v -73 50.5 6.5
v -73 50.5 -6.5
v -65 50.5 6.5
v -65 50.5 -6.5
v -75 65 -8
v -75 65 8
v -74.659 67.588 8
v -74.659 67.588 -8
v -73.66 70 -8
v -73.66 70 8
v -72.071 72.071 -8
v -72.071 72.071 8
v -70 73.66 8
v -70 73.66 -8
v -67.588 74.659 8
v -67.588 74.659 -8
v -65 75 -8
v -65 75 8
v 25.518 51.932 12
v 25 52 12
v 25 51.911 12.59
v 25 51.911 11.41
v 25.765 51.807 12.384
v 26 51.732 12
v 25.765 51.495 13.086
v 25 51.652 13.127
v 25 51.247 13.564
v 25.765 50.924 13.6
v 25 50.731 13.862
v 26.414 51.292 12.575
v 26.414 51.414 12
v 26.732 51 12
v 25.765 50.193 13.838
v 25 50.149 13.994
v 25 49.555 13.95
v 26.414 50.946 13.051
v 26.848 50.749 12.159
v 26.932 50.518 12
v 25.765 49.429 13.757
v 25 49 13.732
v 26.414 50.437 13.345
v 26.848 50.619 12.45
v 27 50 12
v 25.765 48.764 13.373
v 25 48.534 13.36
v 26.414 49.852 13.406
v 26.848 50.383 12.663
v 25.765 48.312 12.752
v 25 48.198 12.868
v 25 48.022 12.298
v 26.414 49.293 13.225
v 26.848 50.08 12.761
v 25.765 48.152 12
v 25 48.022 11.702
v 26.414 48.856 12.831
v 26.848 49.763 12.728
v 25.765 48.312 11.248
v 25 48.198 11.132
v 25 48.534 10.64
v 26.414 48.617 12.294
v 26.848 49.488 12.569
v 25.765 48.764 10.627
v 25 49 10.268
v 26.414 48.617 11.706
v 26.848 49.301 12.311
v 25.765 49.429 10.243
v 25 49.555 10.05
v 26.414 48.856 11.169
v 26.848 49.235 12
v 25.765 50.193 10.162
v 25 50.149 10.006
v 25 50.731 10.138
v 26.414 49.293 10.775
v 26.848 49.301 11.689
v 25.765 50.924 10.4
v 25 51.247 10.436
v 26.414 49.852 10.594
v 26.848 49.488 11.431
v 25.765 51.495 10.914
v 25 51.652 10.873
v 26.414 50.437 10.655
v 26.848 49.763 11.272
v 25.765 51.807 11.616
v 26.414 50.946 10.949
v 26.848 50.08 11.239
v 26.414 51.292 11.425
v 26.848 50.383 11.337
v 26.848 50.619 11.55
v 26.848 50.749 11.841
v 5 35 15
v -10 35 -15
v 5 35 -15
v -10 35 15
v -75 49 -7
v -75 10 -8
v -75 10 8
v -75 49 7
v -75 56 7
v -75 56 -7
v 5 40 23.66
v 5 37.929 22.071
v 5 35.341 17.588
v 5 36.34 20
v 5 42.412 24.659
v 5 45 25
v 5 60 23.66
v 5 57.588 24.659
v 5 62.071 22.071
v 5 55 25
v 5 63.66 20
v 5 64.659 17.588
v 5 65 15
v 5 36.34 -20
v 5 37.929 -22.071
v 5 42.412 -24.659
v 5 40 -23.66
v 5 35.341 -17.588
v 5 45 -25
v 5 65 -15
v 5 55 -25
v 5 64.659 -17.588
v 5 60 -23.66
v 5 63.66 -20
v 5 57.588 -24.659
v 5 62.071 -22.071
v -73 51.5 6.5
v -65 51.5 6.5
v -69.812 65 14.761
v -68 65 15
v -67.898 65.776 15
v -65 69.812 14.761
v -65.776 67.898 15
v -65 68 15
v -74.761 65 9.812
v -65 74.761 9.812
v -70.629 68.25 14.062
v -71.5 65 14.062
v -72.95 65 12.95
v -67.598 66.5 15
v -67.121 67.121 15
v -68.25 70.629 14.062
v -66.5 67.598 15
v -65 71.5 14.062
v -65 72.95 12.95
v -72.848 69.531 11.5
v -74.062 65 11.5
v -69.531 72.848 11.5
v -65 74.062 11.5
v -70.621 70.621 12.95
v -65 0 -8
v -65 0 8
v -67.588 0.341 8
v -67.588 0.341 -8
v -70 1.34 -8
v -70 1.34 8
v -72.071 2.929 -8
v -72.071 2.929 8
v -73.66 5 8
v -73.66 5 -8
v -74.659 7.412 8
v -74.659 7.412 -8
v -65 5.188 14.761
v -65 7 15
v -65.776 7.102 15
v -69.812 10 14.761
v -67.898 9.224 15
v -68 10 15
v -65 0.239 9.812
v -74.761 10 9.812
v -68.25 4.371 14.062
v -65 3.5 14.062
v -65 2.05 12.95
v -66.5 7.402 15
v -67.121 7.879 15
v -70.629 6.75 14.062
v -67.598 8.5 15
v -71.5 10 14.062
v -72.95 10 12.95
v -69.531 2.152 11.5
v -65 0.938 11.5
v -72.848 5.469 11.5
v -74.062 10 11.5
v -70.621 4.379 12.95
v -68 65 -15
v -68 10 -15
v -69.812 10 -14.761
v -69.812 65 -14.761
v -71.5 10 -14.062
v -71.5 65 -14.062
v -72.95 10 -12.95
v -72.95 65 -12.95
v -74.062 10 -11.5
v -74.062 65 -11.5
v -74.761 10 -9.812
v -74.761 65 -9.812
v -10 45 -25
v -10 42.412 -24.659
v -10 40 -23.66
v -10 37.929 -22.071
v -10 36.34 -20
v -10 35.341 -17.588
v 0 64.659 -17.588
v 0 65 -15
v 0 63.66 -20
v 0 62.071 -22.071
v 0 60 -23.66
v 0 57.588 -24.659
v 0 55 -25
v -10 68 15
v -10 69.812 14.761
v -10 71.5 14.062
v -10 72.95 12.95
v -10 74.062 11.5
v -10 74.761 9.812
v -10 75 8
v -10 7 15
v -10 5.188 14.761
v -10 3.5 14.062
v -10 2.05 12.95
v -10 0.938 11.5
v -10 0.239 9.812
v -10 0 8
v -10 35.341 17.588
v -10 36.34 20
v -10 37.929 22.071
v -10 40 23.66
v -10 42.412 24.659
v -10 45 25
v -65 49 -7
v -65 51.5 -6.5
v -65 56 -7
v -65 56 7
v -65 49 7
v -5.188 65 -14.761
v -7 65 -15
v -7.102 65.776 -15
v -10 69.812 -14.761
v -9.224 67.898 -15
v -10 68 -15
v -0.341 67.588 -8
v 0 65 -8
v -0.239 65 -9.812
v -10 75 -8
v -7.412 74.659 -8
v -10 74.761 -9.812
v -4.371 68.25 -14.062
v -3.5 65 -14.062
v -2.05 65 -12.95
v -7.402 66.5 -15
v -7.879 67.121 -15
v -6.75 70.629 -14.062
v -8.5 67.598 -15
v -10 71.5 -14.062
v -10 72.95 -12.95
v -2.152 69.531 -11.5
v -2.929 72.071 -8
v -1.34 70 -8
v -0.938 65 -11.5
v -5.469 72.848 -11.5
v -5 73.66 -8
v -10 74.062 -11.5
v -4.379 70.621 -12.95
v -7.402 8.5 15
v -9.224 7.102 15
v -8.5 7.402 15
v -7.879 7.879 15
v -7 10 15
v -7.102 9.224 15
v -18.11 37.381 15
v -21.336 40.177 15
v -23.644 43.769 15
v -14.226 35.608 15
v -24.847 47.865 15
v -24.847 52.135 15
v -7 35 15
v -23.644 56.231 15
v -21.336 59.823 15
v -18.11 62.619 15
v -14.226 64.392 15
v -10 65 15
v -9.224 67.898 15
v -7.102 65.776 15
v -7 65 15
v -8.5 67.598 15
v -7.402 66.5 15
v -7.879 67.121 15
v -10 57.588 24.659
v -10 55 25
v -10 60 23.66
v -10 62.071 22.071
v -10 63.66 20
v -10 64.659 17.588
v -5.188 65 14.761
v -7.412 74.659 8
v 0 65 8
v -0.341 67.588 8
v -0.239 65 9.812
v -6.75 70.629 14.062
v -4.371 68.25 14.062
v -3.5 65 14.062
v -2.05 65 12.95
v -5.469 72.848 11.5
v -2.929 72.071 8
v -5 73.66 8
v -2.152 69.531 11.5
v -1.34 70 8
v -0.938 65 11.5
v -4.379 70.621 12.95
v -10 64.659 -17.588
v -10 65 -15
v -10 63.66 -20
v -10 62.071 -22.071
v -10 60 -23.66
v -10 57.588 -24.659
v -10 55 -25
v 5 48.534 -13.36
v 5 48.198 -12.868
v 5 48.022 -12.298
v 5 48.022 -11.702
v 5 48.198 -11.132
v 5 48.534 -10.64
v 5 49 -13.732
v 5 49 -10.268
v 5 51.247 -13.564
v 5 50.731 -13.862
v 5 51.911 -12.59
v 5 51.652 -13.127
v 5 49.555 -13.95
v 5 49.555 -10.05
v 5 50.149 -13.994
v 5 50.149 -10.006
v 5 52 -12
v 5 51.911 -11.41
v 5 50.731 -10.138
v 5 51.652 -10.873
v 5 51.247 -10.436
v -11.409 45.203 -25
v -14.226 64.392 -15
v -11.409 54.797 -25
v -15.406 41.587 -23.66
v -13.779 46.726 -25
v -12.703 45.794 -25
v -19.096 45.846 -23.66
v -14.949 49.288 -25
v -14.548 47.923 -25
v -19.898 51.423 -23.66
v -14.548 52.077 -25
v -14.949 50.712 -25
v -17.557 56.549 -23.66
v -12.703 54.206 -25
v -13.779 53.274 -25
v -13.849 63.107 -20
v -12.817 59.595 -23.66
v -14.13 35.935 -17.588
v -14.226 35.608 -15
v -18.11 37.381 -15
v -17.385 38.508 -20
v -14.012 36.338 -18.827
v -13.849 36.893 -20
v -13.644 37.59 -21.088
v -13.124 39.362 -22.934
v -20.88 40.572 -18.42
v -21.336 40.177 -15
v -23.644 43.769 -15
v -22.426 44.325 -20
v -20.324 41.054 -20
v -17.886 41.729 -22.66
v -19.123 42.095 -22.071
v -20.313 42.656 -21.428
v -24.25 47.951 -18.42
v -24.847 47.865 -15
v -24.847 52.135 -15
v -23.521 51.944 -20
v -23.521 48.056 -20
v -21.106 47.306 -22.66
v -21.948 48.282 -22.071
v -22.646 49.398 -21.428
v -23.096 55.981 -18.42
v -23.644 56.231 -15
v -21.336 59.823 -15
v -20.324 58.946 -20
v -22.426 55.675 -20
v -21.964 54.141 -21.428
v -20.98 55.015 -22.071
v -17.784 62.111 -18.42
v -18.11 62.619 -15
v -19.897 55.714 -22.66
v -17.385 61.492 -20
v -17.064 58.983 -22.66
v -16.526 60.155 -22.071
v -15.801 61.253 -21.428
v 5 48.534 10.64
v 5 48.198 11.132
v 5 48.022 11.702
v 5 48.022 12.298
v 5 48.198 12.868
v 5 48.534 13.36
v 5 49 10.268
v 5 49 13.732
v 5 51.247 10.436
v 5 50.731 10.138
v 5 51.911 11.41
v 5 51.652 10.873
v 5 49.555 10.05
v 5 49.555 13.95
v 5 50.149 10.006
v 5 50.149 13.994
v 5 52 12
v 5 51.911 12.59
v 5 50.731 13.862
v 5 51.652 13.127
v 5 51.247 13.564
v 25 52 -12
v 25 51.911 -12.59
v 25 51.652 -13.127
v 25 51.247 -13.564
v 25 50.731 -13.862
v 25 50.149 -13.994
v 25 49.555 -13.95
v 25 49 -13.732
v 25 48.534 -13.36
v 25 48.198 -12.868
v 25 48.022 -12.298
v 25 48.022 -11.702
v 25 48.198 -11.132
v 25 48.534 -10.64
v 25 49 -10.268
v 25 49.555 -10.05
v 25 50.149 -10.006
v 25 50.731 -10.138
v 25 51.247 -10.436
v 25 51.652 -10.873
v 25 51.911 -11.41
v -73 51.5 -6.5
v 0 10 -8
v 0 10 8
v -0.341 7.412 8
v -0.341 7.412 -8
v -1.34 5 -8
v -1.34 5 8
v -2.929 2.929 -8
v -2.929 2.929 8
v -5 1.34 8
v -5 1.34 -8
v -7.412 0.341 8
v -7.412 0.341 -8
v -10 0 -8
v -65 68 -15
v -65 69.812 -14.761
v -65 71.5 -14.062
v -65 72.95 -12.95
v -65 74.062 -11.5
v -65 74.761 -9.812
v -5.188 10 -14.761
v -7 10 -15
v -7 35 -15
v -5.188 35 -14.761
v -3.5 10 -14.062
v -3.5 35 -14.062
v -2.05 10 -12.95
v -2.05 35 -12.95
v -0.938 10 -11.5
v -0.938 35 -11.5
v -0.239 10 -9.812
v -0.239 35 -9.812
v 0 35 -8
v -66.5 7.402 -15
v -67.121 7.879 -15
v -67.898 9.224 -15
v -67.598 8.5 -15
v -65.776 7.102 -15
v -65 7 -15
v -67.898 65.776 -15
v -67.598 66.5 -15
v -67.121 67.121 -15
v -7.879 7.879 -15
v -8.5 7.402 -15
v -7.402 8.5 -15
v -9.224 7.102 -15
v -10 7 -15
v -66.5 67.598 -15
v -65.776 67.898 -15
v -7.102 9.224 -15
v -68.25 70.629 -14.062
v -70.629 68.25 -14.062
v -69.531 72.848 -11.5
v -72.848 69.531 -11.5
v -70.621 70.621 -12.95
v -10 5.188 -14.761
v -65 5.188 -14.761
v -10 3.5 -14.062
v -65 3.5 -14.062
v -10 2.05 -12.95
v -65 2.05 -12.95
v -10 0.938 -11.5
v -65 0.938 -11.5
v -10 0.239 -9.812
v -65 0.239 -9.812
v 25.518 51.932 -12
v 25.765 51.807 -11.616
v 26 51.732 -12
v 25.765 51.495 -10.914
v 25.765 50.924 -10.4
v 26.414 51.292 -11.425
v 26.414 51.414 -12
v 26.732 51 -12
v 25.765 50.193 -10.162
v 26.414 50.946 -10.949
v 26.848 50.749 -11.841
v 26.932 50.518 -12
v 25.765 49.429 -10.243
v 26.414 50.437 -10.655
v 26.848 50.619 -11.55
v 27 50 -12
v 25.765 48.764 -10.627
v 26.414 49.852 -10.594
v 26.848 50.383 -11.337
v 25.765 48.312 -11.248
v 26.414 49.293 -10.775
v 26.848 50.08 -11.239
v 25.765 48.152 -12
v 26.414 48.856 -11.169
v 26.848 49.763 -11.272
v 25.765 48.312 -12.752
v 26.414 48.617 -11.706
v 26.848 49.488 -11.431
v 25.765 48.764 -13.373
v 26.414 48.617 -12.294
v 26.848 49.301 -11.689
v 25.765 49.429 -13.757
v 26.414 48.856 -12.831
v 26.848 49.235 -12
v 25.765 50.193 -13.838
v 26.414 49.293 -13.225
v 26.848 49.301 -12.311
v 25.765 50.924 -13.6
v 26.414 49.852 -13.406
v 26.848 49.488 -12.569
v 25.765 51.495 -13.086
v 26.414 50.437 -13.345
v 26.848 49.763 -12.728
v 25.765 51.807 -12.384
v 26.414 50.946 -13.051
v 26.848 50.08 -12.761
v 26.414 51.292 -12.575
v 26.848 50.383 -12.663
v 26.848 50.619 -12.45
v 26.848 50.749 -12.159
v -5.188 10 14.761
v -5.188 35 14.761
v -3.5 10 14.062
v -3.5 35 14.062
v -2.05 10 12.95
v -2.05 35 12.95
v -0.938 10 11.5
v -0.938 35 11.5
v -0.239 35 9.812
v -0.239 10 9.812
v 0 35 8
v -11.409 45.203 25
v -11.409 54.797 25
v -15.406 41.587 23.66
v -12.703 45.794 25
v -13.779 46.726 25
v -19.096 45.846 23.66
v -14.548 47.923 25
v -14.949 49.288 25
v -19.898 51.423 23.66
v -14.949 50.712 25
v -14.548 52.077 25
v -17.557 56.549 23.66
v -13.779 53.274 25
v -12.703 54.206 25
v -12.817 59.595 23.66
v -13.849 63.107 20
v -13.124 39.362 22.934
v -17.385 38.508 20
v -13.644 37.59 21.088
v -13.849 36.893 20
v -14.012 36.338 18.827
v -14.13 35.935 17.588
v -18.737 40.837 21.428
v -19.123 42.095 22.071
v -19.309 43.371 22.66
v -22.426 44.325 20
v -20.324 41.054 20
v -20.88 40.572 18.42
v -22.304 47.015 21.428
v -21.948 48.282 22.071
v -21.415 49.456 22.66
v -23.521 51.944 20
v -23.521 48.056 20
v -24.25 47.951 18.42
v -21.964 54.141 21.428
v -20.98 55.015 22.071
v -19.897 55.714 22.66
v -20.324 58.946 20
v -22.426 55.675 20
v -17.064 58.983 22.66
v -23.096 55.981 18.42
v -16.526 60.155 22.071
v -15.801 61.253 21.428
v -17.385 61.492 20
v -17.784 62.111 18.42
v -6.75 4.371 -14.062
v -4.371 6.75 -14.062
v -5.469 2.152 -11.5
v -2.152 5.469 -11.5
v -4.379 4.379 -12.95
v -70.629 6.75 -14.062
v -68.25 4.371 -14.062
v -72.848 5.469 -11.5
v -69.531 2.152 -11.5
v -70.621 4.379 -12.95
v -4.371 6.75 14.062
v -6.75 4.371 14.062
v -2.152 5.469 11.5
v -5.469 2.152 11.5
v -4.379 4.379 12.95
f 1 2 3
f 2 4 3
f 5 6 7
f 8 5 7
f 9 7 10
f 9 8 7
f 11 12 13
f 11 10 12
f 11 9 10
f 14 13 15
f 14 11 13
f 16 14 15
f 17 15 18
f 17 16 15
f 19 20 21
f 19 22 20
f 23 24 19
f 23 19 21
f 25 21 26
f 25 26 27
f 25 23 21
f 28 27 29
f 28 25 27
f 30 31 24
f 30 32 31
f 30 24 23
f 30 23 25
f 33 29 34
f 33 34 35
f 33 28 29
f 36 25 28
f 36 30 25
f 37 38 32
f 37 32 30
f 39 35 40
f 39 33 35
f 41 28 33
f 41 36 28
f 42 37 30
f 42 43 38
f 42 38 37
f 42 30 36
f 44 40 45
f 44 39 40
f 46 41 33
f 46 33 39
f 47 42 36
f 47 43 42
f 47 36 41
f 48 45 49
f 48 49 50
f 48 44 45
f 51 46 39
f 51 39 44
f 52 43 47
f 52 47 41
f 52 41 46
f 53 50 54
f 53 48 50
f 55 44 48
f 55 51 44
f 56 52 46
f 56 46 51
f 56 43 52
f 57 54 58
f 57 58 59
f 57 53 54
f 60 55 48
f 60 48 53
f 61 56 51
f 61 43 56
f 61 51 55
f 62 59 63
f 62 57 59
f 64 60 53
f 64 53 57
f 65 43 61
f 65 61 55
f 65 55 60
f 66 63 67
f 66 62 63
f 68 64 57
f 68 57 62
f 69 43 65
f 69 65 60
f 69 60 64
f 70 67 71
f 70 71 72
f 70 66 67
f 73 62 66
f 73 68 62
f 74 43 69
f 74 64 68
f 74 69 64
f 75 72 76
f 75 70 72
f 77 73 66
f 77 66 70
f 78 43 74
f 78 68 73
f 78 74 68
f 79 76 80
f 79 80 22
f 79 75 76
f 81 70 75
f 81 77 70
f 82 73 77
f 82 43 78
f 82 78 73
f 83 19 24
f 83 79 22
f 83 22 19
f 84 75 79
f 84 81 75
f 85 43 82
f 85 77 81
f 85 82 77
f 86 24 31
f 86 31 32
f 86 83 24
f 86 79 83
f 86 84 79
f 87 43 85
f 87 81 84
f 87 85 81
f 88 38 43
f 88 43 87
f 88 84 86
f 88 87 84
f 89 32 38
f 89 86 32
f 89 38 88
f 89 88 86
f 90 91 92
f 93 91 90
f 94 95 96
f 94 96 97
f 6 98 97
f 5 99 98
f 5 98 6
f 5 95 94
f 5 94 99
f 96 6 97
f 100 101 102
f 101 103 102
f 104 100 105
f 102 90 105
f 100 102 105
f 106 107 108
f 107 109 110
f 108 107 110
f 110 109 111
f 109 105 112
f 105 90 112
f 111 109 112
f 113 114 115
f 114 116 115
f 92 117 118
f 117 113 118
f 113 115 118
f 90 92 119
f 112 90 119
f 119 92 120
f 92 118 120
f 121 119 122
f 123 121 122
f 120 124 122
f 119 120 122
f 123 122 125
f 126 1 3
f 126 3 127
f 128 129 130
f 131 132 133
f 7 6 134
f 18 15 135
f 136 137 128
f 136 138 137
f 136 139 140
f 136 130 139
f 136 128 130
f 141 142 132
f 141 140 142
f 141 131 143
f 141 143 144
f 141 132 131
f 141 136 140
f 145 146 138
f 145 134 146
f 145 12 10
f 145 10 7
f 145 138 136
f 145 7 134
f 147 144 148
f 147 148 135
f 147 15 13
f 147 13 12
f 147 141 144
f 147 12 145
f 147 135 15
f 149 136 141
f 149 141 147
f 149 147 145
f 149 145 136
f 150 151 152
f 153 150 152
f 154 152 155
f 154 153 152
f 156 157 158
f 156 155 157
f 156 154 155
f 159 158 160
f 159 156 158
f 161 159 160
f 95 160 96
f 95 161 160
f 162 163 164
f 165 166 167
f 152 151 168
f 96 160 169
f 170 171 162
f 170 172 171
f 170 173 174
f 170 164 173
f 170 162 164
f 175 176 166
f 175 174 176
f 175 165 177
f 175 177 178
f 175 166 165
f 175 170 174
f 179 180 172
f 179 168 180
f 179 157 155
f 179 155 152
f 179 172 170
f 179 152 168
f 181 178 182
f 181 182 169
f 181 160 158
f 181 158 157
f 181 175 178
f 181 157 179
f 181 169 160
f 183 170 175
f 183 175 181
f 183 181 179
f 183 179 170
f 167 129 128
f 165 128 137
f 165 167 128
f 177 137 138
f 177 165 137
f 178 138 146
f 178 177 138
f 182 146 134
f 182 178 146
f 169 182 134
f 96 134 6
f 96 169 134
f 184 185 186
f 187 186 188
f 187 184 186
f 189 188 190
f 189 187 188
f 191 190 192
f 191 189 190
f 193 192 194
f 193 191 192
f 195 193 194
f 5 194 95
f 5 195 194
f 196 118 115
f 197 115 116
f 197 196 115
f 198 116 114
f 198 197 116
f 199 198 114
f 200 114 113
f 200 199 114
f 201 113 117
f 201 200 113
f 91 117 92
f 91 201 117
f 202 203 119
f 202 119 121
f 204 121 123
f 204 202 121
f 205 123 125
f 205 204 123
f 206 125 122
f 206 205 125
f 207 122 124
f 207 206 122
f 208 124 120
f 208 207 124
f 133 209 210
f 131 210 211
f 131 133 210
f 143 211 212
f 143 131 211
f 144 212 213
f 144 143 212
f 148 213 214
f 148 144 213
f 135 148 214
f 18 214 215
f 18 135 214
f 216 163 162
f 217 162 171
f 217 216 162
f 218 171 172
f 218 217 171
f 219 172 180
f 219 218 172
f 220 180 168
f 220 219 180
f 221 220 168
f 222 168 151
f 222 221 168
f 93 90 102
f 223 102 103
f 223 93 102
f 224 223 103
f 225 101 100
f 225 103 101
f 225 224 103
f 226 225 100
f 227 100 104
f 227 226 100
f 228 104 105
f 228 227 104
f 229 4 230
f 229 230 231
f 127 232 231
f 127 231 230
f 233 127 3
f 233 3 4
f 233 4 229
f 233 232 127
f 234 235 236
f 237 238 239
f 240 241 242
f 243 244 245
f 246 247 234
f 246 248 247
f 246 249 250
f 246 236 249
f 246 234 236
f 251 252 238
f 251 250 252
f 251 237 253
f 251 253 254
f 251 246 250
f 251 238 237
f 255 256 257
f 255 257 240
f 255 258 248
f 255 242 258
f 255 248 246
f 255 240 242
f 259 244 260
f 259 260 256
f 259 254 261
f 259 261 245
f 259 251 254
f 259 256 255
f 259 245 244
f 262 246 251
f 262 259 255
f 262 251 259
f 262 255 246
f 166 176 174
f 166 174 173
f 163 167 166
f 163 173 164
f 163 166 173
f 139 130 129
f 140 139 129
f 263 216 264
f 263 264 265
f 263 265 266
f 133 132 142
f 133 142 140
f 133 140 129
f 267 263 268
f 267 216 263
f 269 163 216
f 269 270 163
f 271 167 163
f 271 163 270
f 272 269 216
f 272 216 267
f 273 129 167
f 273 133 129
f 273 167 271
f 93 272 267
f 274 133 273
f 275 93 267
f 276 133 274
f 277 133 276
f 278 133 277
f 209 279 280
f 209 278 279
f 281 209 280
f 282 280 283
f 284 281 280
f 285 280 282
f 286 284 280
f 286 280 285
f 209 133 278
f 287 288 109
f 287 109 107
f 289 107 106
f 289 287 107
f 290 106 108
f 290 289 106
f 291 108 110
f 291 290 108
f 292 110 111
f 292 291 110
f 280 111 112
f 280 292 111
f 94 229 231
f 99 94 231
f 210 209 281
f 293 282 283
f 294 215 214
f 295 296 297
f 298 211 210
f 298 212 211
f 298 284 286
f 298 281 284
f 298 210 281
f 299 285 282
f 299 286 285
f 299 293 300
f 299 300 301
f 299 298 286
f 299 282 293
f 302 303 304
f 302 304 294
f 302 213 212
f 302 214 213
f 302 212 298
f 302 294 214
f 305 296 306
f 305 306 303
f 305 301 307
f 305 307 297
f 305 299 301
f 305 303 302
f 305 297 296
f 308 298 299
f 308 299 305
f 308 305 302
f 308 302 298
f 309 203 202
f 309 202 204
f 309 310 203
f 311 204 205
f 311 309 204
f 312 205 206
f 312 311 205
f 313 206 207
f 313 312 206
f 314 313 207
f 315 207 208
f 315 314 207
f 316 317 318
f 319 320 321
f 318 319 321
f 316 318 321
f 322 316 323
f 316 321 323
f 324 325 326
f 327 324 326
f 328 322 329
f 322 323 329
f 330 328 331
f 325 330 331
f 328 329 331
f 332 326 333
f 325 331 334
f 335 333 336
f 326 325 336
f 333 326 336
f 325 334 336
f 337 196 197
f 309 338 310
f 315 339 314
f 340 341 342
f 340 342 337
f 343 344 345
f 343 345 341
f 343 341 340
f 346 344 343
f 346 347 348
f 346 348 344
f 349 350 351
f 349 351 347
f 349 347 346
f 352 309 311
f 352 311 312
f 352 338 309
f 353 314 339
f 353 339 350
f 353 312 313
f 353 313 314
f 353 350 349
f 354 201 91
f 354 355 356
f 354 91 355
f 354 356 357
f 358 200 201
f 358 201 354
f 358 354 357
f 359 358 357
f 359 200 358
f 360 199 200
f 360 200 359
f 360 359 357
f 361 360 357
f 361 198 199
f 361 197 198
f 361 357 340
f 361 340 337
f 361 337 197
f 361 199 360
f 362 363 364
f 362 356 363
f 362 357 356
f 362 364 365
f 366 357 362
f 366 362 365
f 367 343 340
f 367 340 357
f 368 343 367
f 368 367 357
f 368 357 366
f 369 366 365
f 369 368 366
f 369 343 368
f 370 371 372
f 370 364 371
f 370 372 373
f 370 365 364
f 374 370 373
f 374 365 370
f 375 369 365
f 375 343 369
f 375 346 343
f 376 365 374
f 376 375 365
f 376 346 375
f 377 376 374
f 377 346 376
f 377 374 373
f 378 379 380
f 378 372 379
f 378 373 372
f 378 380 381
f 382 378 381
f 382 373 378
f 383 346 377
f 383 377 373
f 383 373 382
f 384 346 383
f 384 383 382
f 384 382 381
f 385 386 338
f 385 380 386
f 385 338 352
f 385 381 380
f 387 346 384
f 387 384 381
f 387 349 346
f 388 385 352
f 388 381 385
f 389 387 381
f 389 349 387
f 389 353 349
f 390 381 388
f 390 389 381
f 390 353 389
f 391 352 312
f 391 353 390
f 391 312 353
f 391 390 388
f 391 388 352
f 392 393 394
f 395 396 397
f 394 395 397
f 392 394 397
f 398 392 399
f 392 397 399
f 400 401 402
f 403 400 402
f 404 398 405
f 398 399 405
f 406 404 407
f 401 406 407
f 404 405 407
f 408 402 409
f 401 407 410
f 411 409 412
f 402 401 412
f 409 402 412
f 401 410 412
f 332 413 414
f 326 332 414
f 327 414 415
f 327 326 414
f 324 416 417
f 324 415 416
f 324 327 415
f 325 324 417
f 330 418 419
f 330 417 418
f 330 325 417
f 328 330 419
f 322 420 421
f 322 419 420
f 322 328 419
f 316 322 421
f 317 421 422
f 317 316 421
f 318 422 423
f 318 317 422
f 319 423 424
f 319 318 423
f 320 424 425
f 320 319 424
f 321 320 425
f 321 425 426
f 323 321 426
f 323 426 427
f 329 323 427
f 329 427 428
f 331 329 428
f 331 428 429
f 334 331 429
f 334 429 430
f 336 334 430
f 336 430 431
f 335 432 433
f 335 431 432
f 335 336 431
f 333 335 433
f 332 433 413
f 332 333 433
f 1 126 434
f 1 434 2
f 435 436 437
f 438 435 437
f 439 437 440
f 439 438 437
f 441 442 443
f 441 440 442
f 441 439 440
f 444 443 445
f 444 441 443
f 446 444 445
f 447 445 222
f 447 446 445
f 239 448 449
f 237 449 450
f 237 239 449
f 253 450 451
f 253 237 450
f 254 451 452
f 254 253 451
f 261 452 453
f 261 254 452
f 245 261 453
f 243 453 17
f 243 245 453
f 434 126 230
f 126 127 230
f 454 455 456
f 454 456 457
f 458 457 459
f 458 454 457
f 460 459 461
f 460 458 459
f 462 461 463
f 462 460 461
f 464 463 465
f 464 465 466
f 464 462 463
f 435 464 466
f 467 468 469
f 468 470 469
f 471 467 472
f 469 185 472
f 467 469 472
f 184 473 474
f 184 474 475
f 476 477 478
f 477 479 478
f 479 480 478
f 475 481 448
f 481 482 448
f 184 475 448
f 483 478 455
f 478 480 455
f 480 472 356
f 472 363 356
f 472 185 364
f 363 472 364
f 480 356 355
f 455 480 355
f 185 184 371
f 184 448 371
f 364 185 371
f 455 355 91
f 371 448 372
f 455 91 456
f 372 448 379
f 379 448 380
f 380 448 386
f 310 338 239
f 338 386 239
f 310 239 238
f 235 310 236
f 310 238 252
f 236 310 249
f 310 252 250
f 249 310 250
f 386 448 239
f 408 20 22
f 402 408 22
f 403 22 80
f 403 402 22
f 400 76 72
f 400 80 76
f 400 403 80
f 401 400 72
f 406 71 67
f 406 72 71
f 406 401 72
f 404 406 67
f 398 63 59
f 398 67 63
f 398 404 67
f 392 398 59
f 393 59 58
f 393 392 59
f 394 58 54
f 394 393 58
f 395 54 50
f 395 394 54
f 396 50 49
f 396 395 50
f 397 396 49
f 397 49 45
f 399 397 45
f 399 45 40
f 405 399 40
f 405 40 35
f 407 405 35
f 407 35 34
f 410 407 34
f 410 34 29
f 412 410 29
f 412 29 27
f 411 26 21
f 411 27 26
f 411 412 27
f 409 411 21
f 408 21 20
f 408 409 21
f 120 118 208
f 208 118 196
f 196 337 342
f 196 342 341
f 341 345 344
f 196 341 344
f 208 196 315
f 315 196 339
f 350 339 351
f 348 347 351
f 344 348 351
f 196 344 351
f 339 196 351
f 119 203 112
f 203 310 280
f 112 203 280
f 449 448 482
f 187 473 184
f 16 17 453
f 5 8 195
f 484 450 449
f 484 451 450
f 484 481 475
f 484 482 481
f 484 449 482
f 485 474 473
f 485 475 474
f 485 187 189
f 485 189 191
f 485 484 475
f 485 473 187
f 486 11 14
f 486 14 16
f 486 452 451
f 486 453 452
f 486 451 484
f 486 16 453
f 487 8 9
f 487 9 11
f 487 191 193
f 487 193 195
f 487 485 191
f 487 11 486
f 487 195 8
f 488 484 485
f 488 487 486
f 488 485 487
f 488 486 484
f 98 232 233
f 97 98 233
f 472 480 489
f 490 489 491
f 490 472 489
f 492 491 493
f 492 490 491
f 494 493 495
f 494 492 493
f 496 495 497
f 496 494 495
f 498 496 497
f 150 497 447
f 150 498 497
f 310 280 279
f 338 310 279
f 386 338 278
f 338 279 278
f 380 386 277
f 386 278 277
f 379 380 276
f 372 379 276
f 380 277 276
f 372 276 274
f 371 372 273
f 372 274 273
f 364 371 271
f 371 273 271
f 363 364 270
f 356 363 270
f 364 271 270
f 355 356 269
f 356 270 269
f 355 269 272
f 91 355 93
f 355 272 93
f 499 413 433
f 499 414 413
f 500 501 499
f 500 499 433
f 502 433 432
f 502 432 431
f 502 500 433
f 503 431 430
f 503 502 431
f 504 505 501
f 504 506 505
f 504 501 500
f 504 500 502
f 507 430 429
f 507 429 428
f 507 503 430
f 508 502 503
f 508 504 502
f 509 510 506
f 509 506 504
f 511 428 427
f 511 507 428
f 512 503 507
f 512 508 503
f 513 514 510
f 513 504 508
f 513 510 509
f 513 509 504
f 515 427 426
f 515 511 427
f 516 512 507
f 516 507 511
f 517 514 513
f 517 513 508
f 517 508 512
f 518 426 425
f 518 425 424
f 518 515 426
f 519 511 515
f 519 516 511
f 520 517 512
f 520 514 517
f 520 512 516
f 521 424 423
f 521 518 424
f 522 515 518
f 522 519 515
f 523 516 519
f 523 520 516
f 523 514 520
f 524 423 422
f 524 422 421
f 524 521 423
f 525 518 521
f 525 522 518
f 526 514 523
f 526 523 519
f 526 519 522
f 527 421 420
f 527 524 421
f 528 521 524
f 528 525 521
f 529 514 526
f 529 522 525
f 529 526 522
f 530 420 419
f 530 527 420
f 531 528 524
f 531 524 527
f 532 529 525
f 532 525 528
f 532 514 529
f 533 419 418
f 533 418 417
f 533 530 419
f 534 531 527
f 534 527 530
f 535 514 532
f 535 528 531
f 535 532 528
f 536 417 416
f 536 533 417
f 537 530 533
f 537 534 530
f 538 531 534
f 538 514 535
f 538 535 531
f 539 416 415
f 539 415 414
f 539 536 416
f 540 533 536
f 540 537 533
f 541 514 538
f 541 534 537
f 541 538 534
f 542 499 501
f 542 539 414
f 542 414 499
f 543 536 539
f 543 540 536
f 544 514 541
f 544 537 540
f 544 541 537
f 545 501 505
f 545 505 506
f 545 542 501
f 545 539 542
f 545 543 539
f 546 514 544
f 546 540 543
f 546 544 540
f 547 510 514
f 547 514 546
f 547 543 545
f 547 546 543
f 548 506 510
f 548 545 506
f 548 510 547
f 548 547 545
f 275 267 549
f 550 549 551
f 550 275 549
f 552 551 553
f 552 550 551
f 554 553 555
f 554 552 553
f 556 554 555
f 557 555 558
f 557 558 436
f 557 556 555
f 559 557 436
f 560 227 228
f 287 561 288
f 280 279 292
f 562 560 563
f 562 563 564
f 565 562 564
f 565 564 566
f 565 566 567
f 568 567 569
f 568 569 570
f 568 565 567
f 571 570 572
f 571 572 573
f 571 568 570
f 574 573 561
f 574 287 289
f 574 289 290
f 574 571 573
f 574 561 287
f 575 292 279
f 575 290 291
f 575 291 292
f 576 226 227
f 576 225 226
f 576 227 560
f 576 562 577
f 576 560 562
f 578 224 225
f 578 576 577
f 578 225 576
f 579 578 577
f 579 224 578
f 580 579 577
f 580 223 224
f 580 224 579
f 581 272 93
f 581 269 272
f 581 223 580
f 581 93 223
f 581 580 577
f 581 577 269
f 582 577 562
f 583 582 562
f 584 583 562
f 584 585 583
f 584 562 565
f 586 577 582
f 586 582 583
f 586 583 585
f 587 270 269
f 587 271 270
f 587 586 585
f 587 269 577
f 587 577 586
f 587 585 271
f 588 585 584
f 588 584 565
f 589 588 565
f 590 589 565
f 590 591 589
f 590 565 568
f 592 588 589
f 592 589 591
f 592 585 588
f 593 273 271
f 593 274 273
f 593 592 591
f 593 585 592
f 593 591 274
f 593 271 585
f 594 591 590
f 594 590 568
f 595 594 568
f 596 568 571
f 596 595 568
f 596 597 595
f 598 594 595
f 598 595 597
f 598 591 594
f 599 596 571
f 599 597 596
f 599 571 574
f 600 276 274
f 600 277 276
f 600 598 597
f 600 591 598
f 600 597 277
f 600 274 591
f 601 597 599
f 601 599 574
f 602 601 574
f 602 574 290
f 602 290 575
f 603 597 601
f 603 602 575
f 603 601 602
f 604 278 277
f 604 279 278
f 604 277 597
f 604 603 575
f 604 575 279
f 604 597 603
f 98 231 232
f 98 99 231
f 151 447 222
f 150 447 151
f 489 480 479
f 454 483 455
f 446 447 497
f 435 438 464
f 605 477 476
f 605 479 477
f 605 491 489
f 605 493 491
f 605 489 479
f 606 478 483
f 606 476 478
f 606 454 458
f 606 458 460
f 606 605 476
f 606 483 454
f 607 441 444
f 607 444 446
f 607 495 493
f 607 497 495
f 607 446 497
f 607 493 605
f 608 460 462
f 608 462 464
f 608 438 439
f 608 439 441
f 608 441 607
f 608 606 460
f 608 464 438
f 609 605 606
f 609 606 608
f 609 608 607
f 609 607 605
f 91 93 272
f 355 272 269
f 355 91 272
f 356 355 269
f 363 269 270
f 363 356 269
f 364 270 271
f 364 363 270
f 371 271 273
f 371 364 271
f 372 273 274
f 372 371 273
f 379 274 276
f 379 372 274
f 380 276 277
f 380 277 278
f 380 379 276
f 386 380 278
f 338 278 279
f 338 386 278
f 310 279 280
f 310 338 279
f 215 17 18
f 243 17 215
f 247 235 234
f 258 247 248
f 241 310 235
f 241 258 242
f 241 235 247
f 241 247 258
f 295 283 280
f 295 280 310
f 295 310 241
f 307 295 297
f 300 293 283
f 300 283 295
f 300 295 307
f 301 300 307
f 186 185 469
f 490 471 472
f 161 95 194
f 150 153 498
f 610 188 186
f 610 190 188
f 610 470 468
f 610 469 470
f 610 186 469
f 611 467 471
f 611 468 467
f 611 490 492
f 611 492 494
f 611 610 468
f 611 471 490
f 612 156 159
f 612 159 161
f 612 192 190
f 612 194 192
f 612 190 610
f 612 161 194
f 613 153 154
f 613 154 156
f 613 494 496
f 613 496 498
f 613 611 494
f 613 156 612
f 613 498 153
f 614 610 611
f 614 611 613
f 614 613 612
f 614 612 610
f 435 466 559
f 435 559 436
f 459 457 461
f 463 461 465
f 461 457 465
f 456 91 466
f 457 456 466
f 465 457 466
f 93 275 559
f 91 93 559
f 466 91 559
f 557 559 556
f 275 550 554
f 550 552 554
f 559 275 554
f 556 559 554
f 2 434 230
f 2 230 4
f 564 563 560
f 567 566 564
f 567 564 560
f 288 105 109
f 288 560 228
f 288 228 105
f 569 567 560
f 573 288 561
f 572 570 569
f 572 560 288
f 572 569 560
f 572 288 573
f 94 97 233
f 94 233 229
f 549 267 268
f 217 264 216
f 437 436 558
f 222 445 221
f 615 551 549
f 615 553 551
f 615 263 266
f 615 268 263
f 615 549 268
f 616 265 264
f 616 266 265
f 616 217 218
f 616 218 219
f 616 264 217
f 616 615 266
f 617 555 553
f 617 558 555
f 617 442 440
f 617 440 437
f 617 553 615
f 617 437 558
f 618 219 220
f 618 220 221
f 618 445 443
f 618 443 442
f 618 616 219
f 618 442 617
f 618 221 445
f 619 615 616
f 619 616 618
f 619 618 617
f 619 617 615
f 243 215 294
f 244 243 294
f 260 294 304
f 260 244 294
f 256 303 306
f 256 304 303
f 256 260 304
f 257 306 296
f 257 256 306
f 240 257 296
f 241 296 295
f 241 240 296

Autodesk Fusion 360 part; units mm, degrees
sketch "Sketch1" plane through (0, 0, 0) normal (0, 0, 1) x (1, 0, 0)
  line L0 (-10, 0) -> (-65, 0)
  line L1 (-75, 10) -> (-75, 65)
  line L2 (-65, 75) -> (-10, 75)
  line L3 (0, 65) -> (0, 10)
  arc A0 (-10, 0) -> (0, 10) centre (-10, 10) ccw
  arc A1 (-75, 10) -> (-65, 0) centre (-65, 10) ccw
  arc A2 (-65, 75) -> (-75, 65) centre (-65, 65) ccw
  arc A3 (0, 65) -> (-10, 75) centre (-10, 65) ccw
  dimension "d1" = 10
extrude "Extrude1" add sketch "Sketch1" along normal mid plane 30 makes body 1
sketch "Sketch3" plane through (0, 0, 15) normal (0, 0, 1) x (-1, 0, 0)
  arc A0 (10, 0) -> (0, -10) centre (10, -10) ccw
  line L0 (0, -10) -> (0, -65)
  arc A1 (0, -65) -> (10, -75) centre (10, -65) ccw
  line L1 (10, -75) -> (65, -75)
  arc A2 (65, -75) -> (75, -65) centre (65, -65) ccw
  line L2 (75, -65) -> (75, -10)
  arc A3 (75, -10) -> (65, 0) centre (65, -10) ccw
  line L3 (65, 0) -> (10, 0)
  line L4 (10, -65) -> (0, -65)
  line L5 (10, -35) -> (0, -35)
  line L6 (0, -35) -> (0, -65)
  arc A4 (10, -65) -> (10, -35) centre (10, -50) ccw
extrude "Extrude4" cut sketch "Sketch3" against normal blind 45 contours L0 L4 L5 L6 A4 bodies 1
extrude "Extrude5" add sketch "Sketch3" along normal blind 10 and the other way blind 40 separate body contours L0 L4 L5 L6 A4 makes body 2
fillet "Fillet2" radius 10 3 edges at (-5, 65, 25) (-25, 50, 25) (-5, 35, 25) on bodies 2
fillet "Fillet3" radius 10 3 edges at (-5, 35, -25) (-25, 50, -25) (-5, 65, -25) on bodies 2
extrude "Extrude6" add 1 faces at (0, 45, -5) along direction (1, 0, 0) blind 5 on bodies 2 bodies 2
sketch "Sketch4" plane through (5, 0, 0) normal (1, 0, 0) x (0, 1, 0)
  arc A0 (55, -25) -> (65, -15) centre (55, -15) ccw
  line L0 (65, -15) -> (65, 15)
  arc A1 (65, 15) -> (55, 25) centre (55, 15) ccw
  line L1 (55, 25) -> (45, 25)
  arc A2 (45, 25) -> (35, 15) centre (45, 15) ccw
  line L2 (35, 15) -> (35, -15)
  arc A3 (35, -15) -> (45, -25) centre (45, -15) ccw
  line L3 (45, -25) -> (55, -25)
  circle A4 centre (50, 12) radius 2
  circle A5 centre (50, -12) radius 2
extrude "Extrude7" add sketch "Sketch4" along normal blind 22 separate body contours A4 | A5 makes body 3 at (19.6667, 50.637, 13.8959) makes body 4 at (19.6667, 50.637, -10.1041)
fillet "Fillet4" radius 2 2 edges at (27, 48.1353, 11.2768) (27, 48.1353, -12.7232) on bodies 3 4
fillet "Fillet5" radius 7 16 edges at (-2.9289, 72.0711, 15) (-37.5, 75, 15) (-72.0711, 72.0711, 15) (-75, 37.5, 15) (-72.0711, 2.9289, 15) (-37.5, 0, 15) (-2.9289, 2.9289, 15) (0, 22.5, 15) (0, 22.5, -15) (-2.9289, 2.9289, -15) (-37.5, 0, -15) (-72.0711, 2.9289, -15) (-75, 37.5, -15) (-72.0711, 72.0711, -15) (-37.5, 75, -15) (-2.9289, 72.0711, -15) on bodies 1
sketch "Sketch5" plane through (-75, 0, 0) normal (-1, 0, 0) x (0, -1, 0)
  line L0 (-65, -8) -> (-10, -8)
  line L1 (-10, -8) -> (-10, 8)
  line L2 (-10, 8) -> (-65, 8)
  line L3 (-65, 8) -> (-65, -8)
  line L4 (-56, 7) -> (-49, 7)
  line L5 (-49, 7) -> (-49, -7)
  line L6 (-49, -7) -> (-56, -7)
  line L7 (-56, -7) -> (-56, 7)
extrude "Extrude8" cut sketch "Sketch5" against normal blind 10 contours L4 L5 L6 L7 bodies 1
sketch "Sketch6" plane through (-65, 0, 0) normal (-1, 0, 0) x (0, -1, 0)
  line L0 (-56, -7) -> (-49, -7)
  line L1 (-49, -7) -> (-49, 7)
  line L2 (-49, 7) -> (-56, 7)
  line L3 (-56, 7) -> (-56, -7)
  line L4 (-50.5, 6.5) -> (-51.5, 6.5)
  line L5 (-51.5, 6.5) -> (-51.5, -6.5)
  line L6 (-51.5, -6.5) -> (-50.5, -6.5)
  line L7 (-50.5, -6.5) -> (-50.5, 6.5)
extrude "Extrude9" add sketch "Sketch6" along normal blind 10 contours L4 L5 L6 L7 bodies 1
extrude "Extrude10" cut 1 faces at (-75, 51.1667, 2.1667) along direction (1, 0, 0) blind 2 on bodies 1 bodies 1
